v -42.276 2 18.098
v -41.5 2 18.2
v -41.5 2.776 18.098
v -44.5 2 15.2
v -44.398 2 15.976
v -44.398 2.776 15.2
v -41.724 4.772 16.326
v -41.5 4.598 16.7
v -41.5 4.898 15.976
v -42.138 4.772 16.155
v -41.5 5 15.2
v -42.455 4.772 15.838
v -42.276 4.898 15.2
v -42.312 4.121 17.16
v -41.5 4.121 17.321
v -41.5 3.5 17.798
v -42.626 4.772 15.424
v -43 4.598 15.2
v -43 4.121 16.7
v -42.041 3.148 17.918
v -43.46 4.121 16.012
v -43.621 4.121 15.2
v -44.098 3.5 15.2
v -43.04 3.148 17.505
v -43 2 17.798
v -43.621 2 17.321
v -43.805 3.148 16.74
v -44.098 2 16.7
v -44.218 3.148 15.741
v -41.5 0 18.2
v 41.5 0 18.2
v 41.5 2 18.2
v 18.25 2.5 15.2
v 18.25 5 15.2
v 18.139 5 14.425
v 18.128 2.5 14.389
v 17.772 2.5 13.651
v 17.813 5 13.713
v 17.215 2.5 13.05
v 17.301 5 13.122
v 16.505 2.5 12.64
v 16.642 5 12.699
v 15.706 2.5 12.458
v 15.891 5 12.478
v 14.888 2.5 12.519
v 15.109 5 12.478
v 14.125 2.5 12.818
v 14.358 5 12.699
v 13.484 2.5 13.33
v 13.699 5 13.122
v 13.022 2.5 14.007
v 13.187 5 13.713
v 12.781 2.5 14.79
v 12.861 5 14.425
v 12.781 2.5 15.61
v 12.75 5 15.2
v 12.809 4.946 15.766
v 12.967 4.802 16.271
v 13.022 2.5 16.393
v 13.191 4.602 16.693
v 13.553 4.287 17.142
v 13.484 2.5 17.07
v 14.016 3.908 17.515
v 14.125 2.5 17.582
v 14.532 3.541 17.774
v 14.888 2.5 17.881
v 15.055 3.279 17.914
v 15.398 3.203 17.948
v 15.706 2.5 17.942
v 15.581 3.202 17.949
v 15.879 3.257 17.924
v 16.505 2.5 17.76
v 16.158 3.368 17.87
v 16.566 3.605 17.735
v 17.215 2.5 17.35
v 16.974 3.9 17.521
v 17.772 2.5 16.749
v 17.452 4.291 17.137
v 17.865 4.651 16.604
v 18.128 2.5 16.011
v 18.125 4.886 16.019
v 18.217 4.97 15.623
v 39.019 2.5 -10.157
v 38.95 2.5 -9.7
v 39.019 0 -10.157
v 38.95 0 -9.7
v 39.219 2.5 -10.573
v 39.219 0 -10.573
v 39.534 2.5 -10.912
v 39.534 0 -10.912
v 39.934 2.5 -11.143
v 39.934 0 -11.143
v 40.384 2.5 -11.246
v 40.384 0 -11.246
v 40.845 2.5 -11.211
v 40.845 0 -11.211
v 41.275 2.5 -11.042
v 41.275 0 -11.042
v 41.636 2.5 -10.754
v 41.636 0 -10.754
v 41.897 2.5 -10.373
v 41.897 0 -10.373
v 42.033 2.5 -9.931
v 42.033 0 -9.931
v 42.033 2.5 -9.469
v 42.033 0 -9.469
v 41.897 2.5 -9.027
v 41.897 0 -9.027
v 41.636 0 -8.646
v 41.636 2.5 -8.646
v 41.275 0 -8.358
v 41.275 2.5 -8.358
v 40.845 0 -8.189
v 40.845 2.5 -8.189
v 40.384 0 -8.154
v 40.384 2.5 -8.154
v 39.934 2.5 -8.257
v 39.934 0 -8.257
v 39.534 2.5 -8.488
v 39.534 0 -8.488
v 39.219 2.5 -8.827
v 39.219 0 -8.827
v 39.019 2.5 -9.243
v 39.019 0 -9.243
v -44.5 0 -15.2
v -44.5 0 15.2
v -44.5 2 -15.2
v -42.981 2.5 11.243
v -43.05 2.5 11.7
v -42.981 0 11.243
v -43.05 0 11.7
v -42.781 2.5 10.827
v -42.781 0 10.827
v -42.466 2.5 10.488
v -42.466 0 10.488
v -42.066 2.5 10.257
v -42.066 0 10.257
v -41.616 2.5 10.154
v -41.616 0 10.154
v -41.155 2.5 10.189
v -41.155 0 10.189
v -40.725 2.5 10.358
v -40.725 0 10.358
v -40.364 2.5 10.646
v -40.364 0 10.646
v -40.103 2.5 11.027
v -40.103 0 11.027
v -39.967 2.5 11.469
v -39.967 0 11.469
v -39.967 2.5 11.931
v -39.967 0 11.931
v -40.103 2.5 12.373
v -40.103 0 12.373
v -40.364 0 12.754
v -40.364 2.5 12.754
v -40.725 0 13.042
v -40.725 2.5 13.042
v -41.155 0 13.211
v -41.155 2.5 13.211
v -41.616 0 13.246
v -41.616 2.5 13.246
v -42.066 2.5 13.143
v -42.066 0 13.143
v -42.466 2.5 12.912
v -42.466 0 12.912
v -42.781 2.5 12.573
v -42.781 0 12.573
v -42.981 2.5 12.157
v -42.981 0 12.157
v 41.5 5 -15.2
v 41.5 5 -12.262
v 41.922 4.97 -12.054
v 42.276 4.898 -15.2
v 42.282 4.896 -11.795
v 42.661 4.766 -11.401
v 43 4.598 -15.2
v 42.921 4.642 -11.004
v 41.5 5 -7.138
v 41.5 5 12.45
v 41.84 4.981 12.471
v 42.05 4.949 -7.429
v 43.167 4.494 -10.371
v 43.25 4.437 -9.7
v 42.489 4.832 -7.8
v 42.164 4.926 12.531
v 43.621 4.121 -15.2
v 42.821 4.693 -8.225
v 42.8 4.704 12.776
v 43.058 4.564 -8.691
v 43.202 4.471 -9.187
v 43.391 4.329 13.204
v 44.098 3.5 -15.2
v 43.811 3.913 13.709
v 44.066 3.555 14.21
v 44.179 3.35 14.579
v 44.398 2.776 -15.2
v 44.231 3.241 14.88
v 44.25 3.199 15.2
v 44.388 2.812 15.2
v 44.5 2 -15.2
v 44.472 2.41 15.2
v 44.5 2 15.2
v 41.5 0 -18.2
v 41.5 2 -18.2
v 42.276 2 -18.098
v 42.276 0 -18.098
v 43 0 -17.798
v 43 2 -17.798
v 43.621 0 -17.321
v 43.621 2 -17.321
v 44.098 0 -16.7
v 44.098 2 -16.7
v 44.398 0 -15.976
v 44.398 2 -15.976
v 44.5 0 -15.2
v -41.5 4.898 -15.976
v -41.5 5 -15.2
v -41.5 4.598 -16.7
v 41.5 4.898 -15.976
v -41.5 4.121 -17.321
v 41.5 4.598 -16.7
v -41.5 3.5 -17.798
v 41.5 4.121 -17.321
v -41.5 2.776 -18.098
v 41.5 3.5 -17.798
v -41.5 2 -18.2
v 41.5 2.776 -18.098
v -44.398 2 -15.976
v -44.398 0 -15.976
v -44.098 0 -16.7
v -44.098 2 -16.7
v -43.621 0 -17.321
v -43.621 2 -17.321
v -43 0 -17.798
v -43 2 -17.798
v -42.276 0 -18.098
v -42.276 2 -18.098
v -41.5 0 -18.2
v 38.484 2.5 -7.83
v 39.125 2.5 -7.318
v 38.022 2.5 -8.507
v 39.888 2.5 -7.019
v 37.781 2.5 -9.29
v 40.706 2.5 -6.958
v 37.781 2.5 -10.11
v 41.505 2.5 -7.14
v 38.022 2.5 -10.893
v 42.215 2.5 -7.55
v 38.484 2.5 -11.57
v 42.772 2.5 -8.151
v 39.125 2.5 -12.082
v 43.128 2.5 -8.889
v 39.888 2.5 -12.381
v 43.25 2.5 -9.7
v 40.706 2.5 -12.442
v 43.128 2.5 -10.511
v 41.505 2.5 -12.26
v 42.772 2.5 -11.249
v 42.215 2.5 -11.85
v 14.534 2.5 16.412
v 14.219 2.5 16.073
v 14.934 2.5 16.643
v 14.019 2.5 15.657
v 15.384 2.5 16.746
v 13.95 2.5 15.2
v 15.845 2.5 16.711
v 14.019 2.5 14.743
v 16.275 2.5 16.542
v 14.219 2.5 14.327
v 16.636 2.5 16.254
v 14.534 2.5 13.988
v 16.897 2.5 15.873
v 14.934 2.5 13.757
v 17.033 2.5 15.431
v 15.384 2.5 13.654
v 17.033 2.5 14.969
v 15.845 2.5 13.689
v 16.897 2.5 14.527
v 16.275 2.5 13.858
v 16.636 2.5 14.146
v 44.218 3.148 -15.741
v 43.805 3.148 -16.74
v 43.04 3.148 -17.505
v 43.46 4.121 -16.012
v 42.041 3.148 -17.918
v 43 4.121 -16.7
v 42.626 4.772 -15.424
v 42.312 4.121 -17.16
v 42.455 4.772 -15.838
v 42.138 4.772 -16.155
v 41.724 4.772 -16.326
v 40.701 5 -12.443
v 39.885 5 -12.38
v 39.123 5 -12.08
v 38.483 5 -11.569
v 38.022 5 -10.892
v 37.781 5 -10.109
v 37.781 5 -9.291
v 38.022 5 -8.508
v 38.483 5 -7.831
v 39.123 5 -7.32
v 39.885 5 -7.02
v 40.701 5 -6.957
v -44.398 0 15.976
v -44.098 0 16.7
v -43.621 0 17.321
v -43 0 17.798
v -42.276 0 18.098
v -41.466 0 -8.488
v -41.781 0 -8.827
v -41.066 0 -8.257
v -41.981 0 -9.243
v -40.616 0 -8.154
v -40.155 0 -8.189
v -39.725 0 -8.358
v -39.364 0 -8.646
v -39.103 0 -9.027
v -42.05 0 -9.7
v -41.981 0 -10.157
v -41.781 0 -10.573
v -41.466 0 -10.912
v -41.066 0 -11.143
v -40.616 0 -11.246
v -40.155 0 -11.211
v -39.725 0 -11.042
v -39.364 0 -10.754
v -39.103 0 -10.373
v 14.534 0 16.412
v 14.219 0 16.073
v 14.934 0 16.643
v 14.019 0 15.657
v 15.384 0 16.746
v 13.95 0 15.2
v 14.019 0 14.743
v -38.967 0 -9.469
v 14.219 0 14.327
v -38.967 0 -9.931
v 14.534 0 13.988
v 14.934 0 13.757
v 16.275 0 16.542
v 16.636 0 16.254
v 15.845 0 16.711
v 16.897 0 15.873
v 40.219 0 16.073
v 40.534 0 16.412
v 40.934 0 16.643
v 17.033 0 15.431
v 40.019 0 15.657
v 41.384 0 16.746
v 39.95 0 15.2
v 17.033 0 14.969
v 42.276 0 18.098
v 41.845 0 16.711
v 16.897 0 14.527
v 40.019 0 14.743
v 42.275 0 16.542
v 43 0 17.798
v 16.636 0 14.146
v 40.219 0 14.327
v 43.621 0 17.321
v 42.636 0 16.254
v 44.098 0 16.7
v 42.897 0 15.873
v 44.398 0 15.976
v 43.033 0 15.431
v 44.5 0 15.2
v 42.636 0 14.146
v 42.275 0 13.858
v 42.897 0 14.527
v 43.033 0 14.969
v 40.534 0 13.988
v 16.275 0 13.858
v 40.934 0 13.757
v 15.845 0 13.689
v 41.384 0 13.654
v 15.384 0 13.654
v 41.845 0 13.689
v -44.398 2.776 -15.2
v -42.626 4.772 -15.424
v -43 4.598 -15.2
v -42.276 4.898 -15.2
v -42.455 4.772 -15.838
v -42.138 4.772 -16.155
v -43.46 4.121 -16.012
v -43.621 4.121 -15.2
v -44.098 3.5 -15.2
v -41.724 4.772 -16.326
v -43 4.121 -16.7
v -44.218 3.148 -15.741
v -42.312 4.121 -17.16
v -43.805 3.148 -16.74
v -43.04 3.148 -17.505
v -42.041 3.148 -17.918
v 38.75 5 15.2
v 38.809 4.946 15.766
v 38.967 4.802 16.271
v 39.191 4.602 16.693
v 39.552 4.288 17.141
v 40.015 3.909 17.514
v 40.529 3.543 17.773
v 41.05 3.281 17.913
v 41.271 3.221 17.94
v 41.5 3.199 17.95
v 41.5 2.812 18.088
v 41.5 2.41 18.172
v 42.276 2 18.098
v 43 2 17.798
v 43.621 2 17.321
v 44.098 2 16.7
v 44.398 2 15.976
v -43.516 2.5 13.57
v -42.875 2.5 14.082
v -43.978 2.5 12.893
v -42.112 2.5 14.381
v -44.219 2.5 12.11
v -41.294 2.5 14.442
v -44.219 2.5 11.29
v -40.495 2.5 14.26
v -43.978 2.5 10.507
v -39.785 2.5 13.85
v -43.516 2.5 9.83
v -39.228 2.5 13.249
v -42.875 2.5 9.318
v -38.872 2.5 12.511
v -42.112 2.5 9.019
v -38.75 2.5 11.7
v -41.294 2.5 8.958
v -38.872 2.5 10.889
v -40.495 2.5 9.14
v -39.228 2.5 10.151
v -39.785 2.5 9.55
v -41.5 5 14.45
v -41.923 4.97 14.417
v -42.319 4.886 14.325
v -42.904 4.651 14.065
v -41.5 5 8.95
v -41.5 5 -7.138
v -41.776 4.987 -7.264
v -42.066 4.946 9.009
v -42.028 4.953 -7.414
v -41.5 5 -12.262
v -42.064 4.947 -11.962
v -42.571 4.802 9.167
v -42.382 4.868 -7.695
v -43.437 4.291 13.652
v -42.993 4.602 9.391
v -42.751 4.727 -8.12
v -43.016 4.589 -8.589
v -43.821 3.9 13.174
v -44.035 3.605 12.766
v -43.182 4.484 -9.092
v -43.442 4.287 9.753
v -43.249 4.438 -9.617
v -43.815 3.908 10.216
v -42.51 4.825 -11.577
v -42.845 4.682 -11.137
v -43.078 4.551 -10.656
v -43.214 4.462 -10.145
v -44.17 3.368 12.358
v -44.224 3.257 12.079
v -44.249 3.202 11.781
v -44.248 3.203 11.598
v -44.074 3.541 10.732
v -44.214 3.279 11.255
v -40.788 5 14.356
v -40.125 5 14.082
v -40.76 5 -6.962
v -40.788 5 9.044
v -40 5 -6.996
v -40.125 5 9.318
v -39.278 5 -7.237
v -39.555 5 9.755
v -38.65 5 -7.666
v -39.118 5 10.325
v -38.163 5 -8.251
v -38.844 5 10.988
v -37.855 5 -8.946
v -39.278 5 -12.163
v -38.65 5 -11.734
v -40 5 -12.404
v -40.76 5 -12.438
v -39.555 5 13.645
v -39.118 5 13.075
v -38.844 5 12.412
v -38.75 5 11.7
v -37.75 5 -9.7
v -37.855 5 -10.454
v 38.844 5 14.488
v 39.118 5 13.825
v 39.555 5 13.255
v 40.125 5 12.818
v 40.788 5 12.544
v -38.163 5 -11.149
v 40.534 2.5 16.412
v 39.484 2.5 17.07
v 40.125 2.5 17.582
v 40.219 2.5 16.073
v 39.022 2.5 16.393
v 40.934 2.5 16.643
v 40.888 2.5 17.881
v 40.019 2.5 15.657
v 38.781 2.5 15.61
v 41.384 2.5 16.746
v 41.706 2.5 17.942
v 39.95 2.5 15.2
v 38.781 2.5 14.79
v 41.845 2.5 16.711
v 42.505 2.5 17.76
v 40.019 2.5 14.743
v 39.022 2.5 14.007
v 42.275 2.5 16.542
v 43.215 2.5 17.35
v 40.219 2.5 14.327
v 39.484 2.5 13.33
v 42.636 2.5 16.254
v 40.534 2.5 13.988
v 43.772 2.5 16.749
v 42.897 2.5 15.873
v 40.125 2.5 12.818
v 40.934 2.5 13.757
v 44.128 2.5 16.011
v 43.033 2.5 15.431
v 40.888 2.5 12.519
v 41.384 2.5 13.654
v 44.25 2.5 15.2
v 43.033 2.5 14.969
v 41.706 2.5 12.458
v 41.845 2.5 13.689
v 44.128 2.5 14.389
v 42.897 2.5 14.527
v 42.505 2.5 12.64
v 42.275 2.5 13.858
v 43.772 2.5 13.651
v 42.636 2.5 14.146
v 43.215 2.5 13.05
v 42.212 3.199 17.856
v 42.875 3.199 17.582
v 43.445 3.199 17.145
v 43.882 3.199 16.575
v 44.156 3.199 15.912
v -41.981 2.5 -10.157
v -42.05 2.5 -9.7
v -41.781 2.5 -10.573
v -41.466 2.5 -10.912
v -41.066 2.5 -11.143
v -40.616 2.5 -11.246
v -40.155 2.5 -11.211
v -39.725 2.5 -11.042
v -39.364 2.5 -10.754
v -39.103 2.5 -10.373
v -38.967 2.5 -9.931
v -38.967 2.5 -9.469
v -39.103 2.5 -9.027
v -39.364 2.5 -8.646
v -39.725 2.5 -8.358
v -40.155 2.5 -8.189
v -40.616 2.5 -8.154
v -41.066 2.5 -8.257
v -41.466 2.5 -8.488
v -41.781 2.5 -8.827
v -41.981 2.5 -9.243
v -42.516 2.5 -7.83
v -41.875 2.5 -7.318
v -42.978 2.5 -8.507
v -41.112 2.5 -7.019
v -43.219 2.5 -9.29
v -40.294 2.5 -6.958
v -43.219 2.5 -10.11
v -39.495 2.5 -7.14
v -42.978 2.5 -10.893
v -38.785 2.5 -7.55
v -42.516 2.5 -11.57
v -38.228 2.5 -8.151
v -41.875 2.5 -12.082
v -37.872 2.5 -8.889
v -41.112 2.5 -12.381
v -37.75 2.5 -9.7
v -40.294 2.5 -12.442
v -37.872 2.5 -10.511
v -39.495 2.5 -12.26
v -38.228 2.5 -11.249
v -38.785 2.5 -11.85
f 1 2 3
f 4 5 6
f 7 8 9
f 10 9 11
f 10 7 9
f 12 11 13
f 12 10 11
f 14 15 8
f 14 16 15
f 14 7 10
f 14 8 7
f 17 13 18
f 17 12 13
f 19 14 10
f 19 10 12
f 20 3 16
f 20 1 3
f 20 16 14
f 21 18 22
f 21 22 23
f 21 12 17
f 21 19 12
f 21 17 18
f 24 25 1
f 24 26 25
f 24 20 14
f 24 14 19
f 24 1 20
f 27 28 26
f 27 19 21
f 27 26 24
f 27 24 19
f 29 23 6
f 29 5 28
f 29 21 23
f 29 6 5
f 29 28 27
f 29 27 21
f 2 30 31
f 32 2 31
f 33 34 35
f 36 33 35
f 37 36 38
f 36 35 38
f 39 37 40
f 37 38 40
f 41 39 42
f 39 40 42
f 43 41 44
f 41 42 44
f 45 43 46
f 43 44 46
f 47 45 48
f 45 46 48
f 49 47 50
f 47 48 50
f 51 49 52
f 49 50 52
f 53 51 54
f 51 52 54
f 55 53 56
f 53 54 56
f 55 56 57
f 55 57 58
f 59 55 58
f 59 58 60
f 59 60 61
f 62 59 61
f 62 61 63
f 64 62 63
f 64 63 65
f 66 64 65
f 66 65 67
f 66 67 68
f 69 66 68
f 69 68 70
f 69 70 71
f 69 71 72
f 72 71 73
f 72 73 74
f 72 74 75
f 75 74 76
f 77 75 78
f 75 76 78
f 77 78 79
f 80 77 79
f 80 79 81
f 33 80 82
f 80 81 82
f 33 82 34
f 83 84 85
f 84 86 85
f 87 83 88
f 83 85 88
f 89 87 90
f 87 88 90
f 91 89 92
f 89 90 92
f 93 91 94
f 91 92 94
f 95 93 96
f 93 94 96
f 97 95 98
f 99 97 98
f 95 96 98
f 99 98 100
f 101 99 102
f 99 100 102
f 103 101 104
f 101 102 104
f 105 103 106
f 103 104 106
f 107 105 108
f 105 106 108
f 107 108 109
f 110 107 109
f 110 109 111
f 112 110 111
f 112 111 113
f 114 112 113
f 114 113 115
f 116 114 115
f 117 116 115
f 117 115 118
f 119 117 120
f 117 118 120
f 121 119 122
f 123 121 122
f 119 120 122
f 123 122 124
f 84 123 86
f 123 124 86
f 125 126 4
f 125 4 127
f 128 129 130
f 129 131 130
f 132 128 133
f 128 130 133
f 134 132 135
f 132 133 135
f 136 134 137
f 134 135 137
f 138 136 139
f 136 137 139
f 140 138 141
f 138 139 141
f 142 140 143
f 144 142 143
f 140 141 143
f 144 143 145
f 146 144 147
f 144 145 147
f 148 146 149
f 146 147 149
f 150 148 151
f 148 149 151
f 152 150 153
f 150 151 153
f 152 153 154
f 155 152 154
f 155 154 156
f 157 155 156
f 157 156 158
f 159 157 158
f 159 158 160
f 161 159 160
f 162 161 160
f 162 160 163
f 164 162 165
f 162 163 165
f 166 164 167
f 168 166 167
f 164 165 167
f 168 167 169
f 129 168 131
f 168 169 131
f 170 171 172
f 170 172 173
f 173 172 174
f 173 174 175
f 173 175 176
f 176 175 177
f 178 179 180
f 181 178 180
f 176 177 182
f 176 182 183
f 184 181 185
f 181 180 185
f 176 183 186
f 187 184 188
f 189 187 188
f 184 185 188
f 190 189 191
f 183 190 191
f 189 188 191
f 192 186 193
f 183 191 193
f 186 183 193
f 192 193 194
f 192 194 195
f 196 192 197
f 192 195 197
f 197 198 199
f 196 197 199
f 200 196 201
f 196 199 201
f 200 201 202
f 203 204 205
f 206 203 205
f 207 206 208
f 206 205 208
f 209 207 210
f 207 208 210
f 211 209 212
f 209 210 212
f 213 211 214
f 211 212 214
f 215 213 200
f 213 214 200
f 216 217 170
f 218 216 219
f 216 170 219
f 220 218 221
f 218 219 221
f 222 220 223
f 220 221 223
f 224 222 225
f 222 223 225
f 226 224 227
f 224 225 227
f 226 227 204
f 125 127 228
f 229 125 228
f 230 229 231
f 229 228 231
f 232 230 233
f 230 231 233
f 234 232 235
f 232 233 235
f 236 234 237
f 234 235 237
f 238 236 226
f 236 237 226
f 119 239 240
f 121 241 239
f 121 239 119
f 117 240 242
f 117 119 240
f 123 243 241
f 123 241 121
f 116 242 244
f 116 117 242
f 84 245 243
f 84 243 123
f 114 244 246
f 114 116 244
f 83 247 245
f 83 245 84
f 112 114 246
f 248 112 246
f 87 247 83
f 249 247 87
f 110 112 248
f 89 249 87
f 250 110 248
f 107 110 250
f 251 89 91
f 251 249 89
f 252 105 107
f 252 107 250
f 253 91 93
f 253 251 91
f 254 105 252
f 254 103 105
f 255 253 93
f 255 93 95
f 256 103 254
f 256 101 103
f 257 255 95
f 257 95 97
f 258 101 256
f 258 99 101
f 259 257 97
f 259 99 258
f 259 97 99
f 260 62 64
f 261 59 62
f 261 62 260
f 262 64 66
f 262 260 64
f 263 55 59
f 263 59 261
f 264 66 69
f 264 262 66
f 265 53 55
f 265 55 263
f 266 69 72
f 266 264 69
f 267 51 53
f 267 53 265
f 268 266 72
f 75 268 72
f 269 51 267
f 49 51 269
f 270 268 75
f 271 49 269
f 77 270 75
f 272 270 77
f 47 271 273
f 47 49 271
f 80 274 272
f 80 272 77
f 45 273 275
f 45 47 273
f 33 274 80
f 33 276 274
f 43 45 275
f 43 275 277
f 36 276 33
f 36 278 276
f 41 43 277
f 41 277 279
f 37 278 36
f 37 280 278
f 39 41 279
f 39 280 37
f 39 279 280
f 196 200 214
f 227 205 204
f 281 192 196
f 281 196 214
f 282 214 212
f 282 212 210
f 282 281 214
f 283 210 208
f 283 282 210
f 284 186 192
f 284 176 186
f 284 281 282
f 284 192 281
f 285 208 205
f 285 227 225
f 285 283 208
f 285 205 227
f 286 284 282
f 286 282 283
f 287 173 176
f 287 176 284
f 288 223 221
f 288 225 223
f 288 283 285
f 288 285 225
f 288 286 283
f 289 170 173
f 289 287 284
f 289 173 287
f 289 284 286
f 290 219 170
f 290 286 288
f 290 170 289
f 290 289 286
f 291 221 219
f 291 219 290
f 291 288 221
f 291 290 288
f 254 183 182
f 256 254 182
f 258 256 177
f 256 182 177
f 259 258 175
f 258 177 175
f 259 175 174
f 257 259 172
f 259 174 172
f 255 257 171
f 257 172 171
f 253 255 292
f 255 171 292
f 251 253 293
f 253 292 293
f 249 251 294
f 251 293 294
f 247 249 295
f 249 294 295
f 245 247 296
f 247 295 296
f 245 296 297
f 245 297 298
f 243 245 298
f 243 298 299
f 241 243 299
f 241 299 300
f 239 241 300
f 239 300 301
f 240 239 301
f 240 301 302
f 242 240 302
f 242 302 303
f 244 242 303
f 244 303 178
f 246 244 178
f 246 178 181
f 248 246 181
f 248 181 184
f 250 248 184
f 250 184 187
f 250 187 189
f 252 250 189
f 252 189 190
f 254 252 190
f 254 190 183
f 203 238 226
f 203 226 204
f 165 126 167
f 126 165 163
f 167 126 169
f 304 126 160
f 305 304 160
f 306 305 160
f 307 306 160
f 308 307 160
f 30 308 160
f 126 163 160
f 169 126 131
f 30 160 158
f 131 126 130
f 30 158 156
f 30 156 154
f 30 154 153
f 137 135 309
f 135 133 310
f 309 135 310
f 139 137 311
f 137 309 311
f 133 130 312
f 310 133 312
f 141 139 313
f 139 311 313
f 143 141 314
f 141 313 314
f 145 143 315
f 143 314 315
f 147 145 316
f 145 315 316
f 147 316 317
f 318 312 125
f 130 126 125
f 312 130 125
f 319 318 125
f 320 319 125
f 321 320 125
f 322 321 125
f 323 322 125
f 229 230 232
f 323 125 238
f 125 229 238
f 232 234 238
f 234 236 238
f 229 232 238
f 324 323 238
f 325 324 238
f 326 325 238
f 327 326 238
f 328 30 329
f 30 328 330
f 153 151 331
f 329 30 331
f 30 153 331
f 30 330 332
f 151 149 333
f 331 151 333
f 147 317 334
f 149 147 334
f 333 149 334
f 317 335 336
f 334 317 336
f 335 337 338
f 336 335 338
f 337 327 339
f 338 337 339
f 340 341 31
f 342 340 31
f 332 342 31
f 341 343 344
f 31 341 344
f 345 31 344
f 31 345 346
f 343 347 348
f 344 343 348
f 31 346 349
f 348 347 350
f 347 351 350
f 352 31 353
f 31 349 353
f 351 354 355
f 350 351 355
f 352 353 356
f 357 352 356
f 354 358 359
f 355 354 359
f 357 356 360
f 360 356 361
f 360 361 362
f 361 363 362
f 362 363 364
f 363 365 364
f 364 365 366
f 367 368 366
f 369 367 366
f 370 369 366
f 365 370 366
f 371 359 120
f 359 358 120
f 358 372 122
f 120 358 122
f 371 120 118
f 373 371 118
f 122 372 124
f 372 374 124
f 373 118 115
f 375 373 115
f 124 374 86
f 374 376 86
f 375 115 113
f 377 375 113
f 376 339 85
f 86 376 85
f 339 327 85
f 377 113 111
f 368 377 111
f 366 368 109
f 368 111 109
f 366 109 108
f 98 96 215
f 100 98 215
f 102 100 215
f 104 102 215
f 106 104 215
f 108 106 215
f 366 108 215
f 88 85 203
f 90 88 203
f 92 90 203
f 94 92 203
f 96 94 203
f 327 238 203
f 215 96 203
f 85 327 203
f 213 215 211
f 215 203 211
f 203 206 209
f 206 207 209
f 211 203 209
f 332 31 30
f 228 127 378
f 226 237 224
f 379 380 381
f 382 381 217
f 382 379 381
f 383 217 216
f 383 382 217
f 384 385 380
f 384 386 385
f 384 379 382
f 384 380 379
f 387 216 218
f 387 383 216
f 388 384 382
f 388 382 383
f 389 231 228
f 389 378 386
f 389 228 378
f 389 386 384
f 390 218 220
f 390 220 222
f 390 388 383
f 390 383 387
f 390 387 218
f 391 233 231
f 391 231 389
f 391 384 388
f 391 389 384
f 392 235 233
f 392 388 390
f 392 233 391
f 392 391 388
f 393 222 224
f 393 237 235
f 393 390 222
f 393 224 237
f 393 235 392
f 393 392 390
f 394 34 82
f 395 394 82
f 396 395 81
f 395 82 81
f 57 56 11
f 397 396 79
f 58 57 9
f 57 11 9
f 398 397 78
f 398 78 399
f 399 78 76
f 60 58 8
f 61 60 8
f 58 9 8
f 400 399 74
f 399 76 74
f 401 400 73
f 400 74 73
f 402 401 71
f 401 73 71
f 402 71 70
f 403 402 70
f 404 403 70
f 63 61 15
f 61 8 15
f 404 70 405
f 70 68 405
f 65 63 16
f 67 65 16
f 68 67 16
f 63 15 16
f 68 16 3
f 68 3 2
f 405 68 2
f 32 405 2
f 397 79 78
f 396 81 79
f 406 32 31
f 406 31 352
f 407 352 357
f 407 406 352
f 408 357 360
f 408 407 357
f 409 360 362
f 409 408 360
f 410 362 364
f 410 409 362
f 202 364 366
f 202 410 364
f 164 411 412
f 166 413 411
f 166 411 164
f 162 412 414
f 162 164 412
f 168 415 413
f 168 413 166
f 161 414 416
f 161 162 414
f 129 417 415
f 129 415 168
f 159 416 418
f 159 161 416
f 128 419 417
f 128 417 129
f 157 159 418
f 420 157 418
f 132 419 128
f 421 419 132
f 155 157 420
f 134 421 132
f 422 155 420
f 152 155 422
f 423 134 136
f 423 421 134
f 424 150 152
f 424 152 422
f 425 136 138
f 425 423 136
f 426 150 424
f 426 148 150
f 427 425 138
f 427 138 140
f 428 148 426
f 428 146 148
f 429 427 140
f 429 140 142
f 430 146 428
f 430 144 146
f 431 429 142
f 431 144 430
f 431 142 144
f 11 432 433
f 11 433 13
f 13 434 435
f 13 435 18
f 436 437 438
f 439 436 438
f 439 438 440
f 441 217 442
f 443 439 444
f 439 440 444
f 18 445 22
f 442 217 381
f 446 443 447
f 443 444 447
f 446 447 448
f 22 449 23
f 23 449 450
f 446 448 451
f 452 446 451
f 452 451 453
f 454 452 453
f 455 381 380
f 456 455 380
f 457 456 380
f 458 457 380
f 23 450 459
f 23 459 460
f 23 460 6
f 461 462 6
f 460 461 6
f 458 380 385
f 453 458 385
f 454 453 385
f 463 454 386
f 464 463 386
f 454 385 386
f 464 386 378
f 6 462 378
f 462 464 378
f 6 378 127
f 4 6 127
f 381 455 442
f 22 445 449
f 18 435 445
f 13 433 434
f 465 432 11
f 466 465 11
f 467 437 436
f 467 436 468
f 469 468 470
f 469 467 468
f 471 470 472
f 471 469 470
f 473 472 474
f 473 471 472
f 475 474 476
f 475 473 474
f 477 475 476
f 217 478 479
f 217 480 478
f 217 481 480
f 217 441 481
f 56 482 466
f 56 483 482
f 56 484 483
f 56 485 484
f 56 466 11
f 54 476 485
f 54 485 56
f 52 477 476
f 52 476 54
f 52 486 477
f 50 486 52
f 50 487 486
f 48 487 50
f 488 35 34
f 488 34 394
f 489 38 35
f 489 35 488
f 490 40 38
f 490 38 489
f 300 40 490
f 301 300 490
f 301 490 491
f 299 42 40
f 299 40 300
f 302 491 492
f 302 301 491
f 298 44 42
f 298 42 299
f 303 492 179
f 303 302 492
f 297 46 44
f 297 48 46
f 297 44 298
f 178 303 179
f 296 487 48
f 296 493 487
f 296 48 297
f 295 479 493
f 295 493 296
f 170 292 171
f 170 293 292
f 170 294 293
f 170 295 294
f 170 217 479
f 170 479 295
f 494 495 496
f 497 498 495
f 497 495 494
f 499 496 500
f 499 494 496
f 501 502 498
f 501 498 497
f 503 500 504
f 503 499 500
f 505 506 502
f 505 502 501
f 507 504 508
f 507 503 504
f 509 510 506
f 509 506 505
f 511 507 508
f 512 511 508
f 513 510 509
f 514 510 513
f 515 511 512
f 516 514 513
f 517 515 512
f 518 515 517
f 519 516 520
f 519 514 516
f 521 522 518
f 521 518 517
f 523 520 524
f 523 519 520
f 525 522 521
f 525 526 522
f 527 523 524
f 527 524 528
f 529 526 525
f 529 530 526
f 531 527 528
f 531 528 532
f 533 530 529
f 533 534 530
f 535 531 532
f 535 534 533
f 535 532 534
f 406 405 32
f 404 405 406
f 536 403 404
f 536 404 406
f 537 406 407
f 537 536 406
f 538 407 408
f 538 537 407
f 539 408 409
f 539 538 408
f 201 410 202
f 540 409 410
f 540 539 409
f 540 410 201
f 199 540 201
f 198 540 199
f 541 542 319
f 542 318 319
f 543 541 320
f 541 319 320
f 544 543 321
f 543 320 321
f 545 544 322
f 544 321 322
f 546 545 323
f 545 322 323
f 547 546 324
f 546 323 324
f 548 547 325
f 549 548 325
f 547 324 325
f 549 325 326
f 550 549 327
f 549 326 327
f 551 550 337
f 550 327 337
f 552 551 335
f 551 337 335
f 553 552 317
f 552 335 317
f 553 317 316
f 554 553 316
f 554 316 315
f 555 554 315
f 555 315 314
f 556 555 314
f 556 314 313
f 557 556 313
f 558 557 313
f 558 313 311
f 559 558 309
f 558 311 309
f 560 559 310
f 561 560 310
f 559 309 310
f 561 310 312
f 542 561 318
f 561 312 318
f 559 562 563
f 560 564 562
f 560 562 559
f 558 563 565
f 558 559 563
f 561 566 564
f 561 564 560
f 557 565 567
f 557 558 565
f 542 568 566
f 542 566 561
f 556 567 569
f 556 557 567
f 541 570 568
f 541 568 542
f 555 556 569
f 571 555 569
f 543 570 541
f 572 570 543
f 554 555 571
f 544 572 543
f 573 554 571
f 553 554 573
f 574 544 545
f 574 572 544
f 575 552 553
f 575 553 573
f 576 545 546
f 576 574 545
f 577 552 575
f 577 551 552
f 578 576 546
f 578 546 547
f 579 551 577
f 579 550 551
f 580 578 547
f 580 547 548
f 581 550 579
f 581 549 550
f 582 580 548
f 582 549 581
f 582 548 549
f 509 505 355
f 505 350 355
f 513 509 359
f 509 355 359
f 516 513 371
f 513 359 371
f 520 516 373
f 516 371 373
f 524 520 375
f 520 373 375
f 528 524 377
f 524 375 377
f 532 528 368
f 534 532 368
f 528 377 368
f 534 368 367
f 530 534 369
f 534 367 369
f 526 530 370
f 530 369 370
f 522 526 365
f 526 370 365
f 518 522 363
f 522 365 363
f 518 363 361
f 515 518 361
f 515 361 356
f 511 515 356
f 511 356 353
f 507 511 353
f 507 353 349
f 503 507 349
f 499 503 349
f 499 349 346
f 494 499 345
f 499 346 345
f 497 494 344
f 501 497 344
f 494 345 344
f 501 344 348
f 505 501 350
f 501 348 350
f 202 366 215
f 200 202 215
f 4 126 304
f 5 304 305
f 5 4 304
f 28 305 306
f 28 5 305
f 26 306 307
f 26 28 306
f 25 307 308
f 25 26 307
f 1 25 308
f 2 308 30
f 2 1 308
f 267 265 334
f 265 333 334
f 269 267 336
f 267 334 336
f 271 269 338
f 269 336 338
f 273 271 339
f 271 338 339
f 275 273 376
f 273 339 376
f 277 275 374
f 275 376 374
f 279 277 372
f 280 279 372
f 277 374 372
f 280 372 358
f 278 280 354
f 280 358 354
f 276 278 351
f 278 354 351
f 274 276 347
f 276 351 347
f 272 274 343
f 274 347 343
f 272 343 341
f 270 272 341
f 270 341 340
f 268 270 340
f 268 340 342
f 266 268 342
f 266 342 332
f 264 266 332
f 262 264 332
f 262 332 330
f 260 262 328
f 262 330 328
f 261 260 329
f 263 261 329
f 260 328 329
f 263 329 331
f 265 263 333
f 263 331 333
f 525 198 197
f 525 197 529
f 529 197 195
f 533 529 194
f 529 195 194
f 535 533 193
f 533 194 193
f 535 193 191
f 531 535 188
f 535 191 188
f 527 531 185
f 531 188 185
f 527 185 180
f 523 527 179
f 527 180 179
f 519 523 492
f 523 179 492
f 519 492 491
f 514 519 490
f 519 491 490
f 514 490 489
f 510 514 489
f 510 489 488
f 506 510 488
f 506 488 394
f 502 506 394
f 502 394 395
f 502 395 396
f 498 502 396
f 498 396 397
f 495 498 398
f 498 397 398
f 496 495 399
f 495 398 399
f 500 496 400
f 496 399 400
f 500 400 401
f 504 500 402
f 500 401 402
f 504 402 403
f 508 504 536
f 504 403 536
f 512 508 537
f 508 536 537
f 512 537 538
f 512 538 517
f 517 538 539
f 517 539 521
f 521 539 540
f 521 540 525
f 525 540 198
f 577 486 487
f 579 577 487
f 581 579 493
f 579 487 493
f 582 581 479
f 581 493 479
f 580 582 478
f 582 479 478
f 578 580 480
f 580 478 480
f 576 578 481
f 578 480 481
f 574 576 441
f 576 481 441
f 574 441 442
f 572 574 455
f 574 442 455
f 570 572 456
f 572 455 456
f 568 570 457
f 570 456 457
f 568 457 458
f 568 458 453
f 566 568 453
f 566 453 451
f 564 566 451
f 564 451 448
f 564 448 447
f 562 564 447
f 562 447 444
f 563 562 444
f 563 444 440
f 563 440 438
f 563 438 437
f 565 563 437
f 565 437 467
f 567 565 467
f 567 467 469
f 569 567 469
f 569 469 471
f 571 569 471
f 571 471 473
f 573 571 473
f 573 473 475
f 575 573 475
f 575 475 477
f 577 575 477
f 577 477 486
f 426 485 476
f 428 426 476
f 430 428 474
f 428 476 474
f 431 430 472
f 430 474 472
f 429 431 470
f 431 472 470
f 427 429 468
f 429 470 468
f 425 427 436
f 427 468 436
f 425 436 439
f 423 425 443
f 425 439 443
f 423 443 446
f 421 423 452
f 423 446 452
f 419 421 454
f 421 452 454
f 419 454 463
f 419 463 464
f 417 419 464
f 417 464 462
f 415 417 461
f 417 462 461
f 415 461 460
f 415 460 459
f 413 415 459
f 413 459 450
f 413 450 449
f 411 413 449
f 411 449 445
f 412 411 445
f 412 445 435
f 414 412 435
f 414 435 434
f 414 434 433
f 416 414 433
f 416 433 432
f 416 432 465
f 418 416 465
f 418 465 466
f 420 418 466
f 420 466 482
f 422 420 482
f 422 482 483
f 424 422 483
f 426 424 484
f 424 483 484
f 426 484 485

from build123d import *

# Parameters (mm, degrees)
SKETCH1_W                        = 89
SKETCH1_H                        = 36.4
BOSS_EXTRUDE1_DEPTH              = 5
CBORE_FOR_M2_5_SHCS1_D           = 3.1
CBORE_FOR_M2_5_SHCS1_CBORE_D     = 5.5
CBORE_FOR_M2_5_SHCS1_CBORE_DEPTH = 2.5
FILLET3_R                        = 3
FILLET4_R                        = 3


with BuildPart() as part:
    # Sketch1 → Boss-Extrude1 (new body)
    with BuildSketch(Plane(origin=(0, 0, 0), x_dir=(1, 0, 0), z_dir=(0, 1, 0))):
        Rectangle(SKETCH1_W, SKETCH1_H)
    extrude(amount=BOSS_EXTRUDE1_DEPTH)

    # CBORE for M2.5 SHCS1 (through all)
    with Locations(Plane(origin=(0, 5, 0), x_dir=(1, 0, 0), z_dir=(0, 1, 0))):
        with Locations((-40.5, 9.7), (-41.5, -11.7), (15.5, -15.2), (41.5, -15.2), (40.5, 9.7)):
            CounterBoreHole(CBORE_FOR_M2_5_SHCS1_D / 2, CBORE_FOR_M2_5_SHCS1_CBORE_D / 2, CBORE_FOR_M2_5_SHCS1_CBORE_DEPTH)

    # Fillet3
    fillet3_edges = [part.edges().sort_by_distance(p)[0] for p in [
        (44.5, 2.5, 18.2),
        (-44.5, 2.5, 18.2),
        (-44.5, 2.5, -18.2),
        (44.5, 2.5, -18.2),
    ]]
    fillet(fillet3_edges, radius=FILLET3_R)

    # Fillet4
    # the kernel refuses this fillet: 3 mm, written as the material it takes off along each edge
    with BuildSketch(Plane(origin=(-41.5, 5, -15.2), x_dir=(-1, 0, 0), z_dir=(0, 0, 1))) as fillet4_piece_1:
        with BuildLine():
            CenterArc((3 - FILLET4_R, FILLET4_R), FILLET4_R, 270, 90)
            Line((3, FILLET4_R), (3, 0))
            Line((3, 0), (3 - FILLET4_R, 0))
        make_face()
    revolve(axis=Axis((-41.5, 5, -15.2), (0, -1, 0)), revolution_arc=90, mode=Mode.SUBTRACT)
    with BuildSketch(Plane(origin=(41.5, 5, -18.2), x_dir=(0, 0, 1), z_dir=(-1, 0, 0))) as fillet4_piece_2:
        with BuildLine():
            CenterArc((FILLET4_R, -FILLET4_R), FILLET4_R, 90, 90)
            Line((0, -FILLET4_R), (0, 0))
            Line((0, 0), (FILLET4_R, 0))
        make_face()
    extrude(amount=83, mode=Mode.SUBTRACT)
    with BuildSketch(Plane(origin=(41.5, 5, -15.2), x_dir=(1, 0, 0), z_dir=(0, 0, 1))) as fillet4_piece_3:
        with BuildLine():
            CenterArc((3 - FILLET4_R, -FILLET4_R), FILLET4_R, 0, 90)
            Line((3, -FILLET4_R), (3, 0))
            Line((3, 0), (3 - FILLET4_R, 0))
        make_face()
    revolve(axis=Axis((41.5, 5, -15.2), (0, 1, 0)), revolution_arc=90, mode=Mode.SUBTRACT)
    with BuildSketch(Plane(origin=(44.5, 5, 15.2), x_dir=(-1, 0, 0), z_dir=(0, 0, -1)), Plane(origin=(-44.5, 5, -15.2), x_dir=(1, 0, 0), z_dir=(0, 0, 1))) as fillet4_piece_4:
        with BuildLine():
            CenterArc((FILLET4_R, -FILLET4_R), FILLET4_R, 90, 90)
            Line((0, -FILLET4_R), (0, 0))
            Line((0, 0), (FILLET4_R, 0))
        make_face()
    extrude(amount=30.4, mode=Mode.SUBTRACT)
    with BuildSketch(Plane(origin=(-41.5, 5, 18.2), x_dir=(0, -1, 0), z_dir=(1, 0, 0))) as fillet4_piece_5:
        with BuildLine():
            CenterArc((FILLET4_R, FILLET4_R), FILLET4_R, 180, 90)
            Line((0, FILLET4_R), (0, 0))
            Line((0, 0), (FILLET4_R, 0))
        make_face()
    extrude(amount=83, mode=Mode.SUBTRACT)
    with BuildSketch(Plane(origin=(-41.5, 5, 15.2), x_dir=(0, 0, 1), z_dir=(1, 0, 0))) as fillet4_piece_6:
        with BuildLine():
            CenterArc((3 - FILLET4_R, FILLET4_R), FILLET4_R, 270, 90)
            Line((3 - FILLET4_R, 0), (3, 0))
            Line((3, 0), (3, FILLET4_R))
        make_face()
    revolve(axis=Axis((-41.5, 5, 15.2), (0, -1, 0)), revolution_arc=90, mode=Mode.SUBTRACT)
    with BuildSketch(Plane(origin=(41.5, 5, 15.2), x_dir=(0, 0, 1), z_dir=(-1, 0, 0))) as fillet4_piece_7:
        with BuildLine():
            CenterArc((3 - FILLET4_R, -FILLET4_R), FILLET4_R, 0, 90)
            Line((3 - FILLET4_R, 0), (3, 0))
            Line((3, 0), (3, -FILLET4_R))
        make_face()
    revolve(axis=Axis((41.5, 5, 15.2), (0, 1, 0)), revolution_arc=90, mode=Mode.SUBTRACT)


solid = part.part
